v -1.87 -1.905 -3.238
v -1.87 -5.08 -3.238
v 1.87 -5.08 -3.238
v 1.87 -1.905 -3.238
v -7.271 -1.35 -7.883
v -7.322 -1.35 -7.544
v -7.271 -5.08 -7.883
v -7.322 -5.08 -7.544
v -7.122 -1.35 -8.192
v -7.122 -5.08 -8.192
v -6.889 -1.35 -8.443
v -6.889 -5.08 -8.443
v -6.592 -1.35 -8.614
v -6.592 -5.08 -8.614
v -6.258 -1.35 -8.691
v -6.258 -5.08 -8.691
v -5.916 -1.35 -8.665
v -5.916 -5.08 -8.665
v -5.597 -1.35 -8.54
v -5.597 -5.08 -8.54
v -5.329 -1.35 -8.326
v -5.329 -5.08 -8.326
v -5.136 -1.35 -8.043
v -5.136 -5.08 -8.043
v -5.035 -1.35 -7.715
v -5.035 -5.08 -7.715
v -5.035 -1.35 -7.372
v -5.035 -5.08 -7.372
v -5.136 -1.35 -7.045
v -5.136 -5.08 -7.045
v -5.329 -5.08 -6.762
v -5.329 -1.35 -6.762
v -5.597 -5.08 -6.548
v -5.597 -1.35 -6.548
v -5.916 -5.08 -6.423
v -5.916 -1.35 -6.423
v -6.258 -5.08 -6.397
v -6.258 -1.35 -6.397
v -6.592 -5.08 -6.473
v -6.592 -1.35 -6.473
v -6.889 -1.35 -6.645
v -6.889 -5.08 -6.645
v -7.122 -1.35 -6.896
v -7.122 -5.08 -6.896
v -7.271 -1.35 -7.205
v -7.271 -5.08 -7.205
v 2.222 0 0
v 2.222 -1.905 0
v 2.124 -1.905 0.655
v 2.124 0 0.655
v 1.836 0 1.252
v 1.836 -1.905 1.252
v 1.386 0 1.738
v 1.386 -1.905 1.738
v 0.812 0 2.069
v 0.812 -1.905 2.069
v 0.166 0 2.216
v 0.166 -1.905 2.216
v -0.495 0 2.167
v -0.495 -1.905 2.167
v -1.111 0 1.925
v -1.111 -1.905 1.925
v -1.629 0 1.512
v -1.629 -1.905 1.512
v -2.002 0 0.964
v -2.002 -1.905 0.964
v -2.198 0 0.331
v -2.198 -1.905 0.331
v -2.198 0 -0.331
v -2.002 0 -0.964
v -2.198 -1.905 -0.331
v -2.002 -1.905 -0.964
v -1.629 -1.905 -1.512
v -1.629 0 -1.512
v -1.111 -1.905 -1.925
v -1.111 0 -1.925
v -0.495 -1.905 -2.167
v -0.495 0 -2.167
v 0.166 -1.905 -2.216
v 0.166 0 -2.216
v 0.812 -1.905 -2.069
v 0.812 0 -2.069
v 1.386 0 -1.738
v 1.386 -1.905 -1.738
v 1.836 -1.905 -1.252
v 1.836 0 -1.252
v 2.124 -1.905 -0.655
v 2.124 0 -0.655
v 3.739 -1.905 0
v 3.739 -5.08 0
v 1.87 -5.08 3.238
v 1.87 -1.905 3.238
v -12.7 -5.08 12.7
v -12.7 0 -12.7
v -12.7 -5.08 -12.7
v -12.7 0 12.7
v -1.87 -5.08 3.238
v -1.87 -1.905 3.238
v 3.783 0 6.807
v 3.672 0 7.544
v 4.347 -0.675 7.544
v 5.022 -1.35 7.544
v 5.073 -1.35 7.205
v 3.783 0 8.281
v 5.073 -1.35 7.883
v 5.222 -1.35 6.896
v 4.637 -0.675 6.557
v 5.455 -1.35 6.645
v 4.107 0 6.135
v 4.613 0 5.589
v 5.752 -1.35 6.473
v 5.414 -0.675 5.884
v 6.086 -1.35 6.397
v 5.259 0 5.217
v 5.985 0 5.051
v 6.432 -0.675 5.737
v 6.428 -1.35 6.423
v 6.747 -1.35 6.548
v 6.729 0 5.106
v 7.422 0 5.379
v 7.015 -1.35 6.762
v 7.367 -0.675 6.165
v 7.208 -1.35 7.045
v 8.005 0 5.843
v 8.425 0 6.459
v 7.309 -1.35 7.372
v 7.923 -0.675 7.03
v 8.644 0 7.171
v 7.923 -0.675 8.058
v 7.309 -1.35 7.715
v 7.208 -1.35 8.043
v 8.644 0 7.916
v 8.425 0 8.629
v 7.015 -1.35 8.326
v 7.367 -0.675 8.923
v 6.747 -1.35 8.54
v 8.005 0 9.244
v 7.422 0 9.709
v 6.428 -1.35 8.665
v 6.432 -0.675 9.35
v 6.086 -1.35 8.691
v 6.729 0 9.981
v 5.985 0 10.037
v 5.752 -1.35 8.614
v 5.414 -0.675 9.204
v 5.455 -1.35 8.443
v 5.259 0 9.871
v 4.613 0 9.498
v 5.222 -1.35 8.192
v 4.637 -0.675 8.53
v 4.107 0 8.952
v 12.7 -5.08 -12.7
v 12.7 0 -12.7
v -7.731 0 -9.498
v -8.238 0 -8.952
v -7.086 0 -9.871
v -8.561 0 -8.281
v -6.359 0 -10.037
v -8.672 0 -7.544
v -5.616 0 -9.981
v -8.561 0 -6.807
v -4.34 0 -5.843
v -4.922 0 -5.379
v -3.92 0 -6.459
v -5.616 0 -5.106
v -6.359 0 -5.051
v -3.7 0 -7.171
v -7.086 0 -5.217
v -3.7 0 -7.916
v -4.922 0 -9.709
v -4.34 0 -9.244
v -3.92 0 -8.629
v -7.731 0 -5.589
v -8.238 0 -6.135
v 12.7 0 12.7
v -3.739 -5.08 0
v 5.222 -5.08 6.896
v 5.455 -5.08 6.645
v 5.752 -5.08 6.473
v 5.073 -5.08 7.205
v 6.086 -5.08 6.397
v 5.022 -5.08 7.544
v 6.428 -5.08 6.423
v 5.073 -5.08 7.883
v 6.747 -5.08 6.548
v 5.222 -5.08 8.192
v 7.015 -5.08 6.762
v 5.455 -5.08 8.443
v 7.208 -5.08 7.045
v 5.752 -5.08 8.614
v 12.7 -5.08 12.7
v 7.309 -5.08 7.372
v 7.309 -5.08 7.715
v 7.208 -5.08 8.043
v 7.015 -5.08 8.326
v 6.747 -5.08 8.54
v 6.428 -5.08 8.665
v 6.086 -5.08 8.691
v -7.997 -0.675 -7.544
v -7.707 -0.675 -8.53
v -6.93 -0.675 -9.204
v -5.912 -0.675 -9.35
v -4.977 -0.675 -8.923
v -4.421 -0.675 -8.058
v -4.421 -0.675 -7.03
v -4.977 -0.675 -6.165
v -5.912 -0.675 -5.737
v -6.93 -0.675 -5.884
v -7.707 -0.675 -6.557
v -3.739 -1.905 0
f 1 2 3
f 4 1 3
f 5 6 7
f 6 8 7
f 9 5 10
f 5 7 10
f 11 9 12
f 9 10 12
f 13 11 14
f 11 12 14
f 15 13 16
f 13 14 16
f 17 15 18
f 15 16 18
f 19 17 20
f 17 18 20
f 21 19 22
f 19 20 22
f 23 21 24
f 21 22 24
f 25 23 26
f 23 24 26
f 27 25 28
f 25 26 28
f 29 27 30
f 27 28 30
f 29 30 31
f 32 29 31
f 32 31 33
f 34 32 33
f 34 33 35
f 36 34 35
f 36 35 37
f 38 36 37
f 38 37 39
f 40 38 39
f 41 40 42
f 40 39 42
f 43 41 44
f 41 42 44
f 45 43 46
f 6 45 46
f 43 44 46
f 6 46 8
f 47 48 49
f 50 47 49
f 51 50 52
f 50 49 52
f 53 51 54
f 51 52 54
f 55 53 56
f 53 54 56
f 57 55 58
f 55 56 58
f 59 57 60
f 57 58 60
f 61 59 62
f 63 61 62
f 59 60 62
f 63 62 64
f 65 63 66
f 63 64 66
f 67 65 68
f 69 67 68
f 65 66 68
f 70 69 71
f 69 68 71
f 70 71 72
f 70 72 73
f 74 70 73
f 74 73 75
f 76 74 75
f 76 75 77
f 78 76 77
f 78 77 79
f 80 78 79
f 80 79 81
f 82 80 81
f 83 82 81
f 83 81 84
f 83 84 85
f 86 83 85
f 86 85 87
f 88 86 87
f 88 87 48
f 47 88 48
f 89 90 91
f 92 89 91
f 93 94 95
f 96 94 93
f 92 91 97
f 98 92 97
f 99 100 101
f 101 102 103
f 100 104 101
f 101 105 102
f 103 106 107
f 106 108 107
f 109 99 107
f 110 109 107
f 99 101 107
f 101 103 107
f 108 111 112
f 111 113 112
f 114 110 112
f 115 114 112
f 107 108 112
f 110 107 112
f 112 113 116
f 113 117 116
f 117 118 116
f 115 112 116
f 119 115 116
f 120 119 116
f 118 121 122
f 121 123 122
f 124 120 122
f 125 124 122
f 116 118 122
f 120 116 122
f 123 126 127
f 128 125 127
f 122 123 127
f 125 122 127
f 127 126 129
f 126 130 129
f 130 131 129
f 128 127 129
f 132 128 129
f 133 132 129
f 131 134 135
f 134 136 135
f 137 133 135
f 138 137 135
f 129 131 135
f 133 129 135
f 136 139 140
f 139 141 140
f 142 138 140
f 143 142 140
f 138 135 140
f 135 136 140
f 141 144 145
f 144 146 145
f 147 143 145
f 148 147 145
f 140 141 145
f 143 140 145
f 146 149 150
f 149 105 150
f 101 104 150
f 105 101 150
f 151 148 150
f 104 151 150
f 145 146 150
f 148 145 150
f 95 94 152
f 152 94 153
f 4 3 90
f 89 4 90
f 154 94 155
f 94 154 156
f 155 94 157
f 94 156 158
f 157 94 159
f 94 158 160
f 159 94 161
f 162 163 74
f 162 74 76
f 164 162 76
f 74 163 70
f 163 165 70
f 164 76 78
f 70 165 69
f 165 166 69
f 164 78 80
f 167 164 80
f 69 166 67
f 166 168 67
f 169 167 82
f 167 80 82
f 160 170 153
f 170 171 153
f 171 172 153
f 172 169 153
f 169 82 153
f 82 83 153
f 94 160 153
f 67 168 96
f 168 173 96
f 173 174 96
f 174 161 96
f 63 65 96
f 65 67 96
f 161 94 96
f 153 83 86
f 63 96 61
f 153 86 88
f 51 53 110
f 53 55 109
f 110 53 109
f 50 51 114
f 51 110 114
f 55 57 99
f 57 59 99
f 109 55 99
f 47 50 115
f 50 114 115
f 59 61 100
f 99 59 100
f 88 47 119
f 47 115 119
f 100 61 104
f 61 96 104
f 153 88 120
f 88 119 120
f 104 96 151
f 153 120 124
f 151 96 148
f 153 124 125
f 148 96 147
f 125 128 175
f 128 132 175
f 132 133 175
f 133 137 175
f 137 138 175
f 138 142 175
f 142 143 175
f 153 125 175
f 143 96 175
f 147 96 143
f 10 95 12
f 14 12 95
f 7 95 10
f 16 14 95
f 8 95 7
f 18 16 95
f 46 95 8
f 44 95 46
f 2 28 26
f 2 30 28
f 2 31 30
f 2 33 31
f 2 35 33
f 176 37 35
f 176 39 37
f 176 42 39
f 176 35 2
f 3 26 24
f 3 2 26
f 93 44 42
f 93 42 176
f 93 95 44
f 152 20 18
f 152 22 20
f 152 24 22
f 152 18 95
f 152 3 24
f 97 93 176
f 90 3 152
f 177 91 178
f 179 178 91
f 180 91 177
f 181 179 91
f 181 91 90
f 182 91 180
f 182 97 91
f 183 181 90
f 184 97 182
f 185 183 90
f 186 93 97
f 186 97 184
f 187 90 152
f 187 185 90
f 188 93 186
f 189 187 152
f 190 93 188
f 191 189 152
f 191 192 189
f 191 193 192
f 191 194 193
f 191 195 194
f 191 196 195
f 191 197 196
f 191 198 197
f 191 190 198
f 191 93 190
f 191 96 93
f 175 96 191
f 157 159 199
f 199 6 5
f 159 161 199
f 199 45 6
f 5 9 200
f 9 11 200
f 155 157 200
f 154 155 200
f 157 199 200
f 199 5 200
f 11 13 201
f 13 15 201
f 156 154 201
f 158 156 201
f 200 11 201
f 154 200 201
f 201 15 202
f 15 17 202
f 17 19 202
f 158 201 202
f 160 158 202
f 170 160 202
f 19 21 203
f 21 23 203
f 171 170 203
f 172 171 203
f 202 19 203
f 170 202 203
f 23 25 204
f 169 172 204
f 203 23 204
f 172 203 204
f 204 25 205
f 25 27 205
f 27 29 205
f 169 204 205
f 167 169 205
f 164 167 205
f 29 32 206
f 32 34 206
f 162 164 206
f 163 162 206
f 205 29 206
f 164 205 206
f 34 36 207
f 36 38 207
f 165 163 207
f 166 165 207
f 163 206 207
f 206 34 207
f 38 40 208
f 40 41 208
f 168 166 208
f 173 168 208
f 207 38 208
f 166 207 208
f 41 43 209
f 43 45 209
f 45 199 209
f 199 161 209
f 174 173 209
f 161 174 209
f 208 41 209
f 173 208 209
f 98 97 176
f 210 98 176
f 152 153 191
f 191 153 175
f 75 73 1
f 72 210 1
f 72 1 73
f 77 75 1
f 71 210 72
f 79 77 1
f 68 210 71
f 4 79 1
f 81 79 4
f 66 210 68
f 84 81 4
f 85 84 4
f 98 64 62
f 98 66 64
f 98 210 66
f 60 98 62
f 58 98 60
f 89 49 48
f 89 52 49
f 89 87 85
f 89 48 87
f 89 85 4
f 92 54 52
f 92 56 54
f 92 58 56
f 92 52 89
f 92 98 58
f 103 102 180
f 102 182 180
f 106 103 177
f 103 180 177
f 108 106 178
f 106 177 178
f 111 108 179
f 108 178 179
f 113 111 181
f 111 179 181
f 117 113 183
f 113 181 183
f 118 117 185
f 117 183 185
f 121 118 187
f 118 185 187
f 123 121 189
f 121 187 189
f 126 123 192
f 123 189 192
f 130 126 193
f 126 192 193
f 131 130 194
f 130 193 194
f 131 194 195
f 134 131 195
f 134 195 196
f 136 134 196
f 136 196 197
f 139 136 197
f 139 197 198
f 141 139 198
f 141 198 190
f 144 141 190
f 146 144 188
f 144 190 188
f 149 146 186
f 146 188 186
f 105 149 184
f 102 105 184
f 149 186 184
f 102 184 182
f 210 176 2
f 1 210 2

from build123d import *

# Parameters (mm, degrees)
F0_W           = 25.4
F0_H           = 25.4
F1_DEPTH       = 5.08
F3_D           = 2.3
F3_CSINK_D     = 5
F3_CSINK_ANGLE = 90
F5_DEPTH       = 3.175
F6_R           = 2.2225
F7_DEPTH       = 5.081


with BuildPart() as f1:
    # F0 (on Front) → F1 (new body)
    with BuildSketch(Plane.XZ):
        Rectangle(F0_W, F0_H)
    extrude(amount=F1_DEPTH)

    # F3 (through all)
    with Locations(Plane(origin=(0, 0, 0), x_dir=(1, 0, 0), z_dir=(0, 1, 0))):
        with Locations((6.1722, -7.5438), (-6.1722, 7.5438)):
            CounterSinkHole(F3_D / 2, F3_CSINK_D / 2, counter_sink_angle=F3_CSINK_ANGLE)

    # F4 (on face) → F5 (cut)
    with BuildSketch(Plane.XZ.offset(5.08)):
        Polygon((3.7394976935, 0), (1.8697488468, 3.2385), (-1.8697488468, 3.2385), (-3.7394976935, 0), (-1.8697488468, -3.2385), (1.8697488468, -3.2385), align=None)
    extrude(amount=-F5_DEPTH, mode=Mode.SUBTRACT)

    # F6 (on face) → F7 (cut, through all)
    with BuildSketch(Plane.XZ.offset(5.08)):
        Circle(F6_R)
    extrude(amount=-F7_DEPTH, mode=Mode.SUBTRACT)


solid = f1.part
